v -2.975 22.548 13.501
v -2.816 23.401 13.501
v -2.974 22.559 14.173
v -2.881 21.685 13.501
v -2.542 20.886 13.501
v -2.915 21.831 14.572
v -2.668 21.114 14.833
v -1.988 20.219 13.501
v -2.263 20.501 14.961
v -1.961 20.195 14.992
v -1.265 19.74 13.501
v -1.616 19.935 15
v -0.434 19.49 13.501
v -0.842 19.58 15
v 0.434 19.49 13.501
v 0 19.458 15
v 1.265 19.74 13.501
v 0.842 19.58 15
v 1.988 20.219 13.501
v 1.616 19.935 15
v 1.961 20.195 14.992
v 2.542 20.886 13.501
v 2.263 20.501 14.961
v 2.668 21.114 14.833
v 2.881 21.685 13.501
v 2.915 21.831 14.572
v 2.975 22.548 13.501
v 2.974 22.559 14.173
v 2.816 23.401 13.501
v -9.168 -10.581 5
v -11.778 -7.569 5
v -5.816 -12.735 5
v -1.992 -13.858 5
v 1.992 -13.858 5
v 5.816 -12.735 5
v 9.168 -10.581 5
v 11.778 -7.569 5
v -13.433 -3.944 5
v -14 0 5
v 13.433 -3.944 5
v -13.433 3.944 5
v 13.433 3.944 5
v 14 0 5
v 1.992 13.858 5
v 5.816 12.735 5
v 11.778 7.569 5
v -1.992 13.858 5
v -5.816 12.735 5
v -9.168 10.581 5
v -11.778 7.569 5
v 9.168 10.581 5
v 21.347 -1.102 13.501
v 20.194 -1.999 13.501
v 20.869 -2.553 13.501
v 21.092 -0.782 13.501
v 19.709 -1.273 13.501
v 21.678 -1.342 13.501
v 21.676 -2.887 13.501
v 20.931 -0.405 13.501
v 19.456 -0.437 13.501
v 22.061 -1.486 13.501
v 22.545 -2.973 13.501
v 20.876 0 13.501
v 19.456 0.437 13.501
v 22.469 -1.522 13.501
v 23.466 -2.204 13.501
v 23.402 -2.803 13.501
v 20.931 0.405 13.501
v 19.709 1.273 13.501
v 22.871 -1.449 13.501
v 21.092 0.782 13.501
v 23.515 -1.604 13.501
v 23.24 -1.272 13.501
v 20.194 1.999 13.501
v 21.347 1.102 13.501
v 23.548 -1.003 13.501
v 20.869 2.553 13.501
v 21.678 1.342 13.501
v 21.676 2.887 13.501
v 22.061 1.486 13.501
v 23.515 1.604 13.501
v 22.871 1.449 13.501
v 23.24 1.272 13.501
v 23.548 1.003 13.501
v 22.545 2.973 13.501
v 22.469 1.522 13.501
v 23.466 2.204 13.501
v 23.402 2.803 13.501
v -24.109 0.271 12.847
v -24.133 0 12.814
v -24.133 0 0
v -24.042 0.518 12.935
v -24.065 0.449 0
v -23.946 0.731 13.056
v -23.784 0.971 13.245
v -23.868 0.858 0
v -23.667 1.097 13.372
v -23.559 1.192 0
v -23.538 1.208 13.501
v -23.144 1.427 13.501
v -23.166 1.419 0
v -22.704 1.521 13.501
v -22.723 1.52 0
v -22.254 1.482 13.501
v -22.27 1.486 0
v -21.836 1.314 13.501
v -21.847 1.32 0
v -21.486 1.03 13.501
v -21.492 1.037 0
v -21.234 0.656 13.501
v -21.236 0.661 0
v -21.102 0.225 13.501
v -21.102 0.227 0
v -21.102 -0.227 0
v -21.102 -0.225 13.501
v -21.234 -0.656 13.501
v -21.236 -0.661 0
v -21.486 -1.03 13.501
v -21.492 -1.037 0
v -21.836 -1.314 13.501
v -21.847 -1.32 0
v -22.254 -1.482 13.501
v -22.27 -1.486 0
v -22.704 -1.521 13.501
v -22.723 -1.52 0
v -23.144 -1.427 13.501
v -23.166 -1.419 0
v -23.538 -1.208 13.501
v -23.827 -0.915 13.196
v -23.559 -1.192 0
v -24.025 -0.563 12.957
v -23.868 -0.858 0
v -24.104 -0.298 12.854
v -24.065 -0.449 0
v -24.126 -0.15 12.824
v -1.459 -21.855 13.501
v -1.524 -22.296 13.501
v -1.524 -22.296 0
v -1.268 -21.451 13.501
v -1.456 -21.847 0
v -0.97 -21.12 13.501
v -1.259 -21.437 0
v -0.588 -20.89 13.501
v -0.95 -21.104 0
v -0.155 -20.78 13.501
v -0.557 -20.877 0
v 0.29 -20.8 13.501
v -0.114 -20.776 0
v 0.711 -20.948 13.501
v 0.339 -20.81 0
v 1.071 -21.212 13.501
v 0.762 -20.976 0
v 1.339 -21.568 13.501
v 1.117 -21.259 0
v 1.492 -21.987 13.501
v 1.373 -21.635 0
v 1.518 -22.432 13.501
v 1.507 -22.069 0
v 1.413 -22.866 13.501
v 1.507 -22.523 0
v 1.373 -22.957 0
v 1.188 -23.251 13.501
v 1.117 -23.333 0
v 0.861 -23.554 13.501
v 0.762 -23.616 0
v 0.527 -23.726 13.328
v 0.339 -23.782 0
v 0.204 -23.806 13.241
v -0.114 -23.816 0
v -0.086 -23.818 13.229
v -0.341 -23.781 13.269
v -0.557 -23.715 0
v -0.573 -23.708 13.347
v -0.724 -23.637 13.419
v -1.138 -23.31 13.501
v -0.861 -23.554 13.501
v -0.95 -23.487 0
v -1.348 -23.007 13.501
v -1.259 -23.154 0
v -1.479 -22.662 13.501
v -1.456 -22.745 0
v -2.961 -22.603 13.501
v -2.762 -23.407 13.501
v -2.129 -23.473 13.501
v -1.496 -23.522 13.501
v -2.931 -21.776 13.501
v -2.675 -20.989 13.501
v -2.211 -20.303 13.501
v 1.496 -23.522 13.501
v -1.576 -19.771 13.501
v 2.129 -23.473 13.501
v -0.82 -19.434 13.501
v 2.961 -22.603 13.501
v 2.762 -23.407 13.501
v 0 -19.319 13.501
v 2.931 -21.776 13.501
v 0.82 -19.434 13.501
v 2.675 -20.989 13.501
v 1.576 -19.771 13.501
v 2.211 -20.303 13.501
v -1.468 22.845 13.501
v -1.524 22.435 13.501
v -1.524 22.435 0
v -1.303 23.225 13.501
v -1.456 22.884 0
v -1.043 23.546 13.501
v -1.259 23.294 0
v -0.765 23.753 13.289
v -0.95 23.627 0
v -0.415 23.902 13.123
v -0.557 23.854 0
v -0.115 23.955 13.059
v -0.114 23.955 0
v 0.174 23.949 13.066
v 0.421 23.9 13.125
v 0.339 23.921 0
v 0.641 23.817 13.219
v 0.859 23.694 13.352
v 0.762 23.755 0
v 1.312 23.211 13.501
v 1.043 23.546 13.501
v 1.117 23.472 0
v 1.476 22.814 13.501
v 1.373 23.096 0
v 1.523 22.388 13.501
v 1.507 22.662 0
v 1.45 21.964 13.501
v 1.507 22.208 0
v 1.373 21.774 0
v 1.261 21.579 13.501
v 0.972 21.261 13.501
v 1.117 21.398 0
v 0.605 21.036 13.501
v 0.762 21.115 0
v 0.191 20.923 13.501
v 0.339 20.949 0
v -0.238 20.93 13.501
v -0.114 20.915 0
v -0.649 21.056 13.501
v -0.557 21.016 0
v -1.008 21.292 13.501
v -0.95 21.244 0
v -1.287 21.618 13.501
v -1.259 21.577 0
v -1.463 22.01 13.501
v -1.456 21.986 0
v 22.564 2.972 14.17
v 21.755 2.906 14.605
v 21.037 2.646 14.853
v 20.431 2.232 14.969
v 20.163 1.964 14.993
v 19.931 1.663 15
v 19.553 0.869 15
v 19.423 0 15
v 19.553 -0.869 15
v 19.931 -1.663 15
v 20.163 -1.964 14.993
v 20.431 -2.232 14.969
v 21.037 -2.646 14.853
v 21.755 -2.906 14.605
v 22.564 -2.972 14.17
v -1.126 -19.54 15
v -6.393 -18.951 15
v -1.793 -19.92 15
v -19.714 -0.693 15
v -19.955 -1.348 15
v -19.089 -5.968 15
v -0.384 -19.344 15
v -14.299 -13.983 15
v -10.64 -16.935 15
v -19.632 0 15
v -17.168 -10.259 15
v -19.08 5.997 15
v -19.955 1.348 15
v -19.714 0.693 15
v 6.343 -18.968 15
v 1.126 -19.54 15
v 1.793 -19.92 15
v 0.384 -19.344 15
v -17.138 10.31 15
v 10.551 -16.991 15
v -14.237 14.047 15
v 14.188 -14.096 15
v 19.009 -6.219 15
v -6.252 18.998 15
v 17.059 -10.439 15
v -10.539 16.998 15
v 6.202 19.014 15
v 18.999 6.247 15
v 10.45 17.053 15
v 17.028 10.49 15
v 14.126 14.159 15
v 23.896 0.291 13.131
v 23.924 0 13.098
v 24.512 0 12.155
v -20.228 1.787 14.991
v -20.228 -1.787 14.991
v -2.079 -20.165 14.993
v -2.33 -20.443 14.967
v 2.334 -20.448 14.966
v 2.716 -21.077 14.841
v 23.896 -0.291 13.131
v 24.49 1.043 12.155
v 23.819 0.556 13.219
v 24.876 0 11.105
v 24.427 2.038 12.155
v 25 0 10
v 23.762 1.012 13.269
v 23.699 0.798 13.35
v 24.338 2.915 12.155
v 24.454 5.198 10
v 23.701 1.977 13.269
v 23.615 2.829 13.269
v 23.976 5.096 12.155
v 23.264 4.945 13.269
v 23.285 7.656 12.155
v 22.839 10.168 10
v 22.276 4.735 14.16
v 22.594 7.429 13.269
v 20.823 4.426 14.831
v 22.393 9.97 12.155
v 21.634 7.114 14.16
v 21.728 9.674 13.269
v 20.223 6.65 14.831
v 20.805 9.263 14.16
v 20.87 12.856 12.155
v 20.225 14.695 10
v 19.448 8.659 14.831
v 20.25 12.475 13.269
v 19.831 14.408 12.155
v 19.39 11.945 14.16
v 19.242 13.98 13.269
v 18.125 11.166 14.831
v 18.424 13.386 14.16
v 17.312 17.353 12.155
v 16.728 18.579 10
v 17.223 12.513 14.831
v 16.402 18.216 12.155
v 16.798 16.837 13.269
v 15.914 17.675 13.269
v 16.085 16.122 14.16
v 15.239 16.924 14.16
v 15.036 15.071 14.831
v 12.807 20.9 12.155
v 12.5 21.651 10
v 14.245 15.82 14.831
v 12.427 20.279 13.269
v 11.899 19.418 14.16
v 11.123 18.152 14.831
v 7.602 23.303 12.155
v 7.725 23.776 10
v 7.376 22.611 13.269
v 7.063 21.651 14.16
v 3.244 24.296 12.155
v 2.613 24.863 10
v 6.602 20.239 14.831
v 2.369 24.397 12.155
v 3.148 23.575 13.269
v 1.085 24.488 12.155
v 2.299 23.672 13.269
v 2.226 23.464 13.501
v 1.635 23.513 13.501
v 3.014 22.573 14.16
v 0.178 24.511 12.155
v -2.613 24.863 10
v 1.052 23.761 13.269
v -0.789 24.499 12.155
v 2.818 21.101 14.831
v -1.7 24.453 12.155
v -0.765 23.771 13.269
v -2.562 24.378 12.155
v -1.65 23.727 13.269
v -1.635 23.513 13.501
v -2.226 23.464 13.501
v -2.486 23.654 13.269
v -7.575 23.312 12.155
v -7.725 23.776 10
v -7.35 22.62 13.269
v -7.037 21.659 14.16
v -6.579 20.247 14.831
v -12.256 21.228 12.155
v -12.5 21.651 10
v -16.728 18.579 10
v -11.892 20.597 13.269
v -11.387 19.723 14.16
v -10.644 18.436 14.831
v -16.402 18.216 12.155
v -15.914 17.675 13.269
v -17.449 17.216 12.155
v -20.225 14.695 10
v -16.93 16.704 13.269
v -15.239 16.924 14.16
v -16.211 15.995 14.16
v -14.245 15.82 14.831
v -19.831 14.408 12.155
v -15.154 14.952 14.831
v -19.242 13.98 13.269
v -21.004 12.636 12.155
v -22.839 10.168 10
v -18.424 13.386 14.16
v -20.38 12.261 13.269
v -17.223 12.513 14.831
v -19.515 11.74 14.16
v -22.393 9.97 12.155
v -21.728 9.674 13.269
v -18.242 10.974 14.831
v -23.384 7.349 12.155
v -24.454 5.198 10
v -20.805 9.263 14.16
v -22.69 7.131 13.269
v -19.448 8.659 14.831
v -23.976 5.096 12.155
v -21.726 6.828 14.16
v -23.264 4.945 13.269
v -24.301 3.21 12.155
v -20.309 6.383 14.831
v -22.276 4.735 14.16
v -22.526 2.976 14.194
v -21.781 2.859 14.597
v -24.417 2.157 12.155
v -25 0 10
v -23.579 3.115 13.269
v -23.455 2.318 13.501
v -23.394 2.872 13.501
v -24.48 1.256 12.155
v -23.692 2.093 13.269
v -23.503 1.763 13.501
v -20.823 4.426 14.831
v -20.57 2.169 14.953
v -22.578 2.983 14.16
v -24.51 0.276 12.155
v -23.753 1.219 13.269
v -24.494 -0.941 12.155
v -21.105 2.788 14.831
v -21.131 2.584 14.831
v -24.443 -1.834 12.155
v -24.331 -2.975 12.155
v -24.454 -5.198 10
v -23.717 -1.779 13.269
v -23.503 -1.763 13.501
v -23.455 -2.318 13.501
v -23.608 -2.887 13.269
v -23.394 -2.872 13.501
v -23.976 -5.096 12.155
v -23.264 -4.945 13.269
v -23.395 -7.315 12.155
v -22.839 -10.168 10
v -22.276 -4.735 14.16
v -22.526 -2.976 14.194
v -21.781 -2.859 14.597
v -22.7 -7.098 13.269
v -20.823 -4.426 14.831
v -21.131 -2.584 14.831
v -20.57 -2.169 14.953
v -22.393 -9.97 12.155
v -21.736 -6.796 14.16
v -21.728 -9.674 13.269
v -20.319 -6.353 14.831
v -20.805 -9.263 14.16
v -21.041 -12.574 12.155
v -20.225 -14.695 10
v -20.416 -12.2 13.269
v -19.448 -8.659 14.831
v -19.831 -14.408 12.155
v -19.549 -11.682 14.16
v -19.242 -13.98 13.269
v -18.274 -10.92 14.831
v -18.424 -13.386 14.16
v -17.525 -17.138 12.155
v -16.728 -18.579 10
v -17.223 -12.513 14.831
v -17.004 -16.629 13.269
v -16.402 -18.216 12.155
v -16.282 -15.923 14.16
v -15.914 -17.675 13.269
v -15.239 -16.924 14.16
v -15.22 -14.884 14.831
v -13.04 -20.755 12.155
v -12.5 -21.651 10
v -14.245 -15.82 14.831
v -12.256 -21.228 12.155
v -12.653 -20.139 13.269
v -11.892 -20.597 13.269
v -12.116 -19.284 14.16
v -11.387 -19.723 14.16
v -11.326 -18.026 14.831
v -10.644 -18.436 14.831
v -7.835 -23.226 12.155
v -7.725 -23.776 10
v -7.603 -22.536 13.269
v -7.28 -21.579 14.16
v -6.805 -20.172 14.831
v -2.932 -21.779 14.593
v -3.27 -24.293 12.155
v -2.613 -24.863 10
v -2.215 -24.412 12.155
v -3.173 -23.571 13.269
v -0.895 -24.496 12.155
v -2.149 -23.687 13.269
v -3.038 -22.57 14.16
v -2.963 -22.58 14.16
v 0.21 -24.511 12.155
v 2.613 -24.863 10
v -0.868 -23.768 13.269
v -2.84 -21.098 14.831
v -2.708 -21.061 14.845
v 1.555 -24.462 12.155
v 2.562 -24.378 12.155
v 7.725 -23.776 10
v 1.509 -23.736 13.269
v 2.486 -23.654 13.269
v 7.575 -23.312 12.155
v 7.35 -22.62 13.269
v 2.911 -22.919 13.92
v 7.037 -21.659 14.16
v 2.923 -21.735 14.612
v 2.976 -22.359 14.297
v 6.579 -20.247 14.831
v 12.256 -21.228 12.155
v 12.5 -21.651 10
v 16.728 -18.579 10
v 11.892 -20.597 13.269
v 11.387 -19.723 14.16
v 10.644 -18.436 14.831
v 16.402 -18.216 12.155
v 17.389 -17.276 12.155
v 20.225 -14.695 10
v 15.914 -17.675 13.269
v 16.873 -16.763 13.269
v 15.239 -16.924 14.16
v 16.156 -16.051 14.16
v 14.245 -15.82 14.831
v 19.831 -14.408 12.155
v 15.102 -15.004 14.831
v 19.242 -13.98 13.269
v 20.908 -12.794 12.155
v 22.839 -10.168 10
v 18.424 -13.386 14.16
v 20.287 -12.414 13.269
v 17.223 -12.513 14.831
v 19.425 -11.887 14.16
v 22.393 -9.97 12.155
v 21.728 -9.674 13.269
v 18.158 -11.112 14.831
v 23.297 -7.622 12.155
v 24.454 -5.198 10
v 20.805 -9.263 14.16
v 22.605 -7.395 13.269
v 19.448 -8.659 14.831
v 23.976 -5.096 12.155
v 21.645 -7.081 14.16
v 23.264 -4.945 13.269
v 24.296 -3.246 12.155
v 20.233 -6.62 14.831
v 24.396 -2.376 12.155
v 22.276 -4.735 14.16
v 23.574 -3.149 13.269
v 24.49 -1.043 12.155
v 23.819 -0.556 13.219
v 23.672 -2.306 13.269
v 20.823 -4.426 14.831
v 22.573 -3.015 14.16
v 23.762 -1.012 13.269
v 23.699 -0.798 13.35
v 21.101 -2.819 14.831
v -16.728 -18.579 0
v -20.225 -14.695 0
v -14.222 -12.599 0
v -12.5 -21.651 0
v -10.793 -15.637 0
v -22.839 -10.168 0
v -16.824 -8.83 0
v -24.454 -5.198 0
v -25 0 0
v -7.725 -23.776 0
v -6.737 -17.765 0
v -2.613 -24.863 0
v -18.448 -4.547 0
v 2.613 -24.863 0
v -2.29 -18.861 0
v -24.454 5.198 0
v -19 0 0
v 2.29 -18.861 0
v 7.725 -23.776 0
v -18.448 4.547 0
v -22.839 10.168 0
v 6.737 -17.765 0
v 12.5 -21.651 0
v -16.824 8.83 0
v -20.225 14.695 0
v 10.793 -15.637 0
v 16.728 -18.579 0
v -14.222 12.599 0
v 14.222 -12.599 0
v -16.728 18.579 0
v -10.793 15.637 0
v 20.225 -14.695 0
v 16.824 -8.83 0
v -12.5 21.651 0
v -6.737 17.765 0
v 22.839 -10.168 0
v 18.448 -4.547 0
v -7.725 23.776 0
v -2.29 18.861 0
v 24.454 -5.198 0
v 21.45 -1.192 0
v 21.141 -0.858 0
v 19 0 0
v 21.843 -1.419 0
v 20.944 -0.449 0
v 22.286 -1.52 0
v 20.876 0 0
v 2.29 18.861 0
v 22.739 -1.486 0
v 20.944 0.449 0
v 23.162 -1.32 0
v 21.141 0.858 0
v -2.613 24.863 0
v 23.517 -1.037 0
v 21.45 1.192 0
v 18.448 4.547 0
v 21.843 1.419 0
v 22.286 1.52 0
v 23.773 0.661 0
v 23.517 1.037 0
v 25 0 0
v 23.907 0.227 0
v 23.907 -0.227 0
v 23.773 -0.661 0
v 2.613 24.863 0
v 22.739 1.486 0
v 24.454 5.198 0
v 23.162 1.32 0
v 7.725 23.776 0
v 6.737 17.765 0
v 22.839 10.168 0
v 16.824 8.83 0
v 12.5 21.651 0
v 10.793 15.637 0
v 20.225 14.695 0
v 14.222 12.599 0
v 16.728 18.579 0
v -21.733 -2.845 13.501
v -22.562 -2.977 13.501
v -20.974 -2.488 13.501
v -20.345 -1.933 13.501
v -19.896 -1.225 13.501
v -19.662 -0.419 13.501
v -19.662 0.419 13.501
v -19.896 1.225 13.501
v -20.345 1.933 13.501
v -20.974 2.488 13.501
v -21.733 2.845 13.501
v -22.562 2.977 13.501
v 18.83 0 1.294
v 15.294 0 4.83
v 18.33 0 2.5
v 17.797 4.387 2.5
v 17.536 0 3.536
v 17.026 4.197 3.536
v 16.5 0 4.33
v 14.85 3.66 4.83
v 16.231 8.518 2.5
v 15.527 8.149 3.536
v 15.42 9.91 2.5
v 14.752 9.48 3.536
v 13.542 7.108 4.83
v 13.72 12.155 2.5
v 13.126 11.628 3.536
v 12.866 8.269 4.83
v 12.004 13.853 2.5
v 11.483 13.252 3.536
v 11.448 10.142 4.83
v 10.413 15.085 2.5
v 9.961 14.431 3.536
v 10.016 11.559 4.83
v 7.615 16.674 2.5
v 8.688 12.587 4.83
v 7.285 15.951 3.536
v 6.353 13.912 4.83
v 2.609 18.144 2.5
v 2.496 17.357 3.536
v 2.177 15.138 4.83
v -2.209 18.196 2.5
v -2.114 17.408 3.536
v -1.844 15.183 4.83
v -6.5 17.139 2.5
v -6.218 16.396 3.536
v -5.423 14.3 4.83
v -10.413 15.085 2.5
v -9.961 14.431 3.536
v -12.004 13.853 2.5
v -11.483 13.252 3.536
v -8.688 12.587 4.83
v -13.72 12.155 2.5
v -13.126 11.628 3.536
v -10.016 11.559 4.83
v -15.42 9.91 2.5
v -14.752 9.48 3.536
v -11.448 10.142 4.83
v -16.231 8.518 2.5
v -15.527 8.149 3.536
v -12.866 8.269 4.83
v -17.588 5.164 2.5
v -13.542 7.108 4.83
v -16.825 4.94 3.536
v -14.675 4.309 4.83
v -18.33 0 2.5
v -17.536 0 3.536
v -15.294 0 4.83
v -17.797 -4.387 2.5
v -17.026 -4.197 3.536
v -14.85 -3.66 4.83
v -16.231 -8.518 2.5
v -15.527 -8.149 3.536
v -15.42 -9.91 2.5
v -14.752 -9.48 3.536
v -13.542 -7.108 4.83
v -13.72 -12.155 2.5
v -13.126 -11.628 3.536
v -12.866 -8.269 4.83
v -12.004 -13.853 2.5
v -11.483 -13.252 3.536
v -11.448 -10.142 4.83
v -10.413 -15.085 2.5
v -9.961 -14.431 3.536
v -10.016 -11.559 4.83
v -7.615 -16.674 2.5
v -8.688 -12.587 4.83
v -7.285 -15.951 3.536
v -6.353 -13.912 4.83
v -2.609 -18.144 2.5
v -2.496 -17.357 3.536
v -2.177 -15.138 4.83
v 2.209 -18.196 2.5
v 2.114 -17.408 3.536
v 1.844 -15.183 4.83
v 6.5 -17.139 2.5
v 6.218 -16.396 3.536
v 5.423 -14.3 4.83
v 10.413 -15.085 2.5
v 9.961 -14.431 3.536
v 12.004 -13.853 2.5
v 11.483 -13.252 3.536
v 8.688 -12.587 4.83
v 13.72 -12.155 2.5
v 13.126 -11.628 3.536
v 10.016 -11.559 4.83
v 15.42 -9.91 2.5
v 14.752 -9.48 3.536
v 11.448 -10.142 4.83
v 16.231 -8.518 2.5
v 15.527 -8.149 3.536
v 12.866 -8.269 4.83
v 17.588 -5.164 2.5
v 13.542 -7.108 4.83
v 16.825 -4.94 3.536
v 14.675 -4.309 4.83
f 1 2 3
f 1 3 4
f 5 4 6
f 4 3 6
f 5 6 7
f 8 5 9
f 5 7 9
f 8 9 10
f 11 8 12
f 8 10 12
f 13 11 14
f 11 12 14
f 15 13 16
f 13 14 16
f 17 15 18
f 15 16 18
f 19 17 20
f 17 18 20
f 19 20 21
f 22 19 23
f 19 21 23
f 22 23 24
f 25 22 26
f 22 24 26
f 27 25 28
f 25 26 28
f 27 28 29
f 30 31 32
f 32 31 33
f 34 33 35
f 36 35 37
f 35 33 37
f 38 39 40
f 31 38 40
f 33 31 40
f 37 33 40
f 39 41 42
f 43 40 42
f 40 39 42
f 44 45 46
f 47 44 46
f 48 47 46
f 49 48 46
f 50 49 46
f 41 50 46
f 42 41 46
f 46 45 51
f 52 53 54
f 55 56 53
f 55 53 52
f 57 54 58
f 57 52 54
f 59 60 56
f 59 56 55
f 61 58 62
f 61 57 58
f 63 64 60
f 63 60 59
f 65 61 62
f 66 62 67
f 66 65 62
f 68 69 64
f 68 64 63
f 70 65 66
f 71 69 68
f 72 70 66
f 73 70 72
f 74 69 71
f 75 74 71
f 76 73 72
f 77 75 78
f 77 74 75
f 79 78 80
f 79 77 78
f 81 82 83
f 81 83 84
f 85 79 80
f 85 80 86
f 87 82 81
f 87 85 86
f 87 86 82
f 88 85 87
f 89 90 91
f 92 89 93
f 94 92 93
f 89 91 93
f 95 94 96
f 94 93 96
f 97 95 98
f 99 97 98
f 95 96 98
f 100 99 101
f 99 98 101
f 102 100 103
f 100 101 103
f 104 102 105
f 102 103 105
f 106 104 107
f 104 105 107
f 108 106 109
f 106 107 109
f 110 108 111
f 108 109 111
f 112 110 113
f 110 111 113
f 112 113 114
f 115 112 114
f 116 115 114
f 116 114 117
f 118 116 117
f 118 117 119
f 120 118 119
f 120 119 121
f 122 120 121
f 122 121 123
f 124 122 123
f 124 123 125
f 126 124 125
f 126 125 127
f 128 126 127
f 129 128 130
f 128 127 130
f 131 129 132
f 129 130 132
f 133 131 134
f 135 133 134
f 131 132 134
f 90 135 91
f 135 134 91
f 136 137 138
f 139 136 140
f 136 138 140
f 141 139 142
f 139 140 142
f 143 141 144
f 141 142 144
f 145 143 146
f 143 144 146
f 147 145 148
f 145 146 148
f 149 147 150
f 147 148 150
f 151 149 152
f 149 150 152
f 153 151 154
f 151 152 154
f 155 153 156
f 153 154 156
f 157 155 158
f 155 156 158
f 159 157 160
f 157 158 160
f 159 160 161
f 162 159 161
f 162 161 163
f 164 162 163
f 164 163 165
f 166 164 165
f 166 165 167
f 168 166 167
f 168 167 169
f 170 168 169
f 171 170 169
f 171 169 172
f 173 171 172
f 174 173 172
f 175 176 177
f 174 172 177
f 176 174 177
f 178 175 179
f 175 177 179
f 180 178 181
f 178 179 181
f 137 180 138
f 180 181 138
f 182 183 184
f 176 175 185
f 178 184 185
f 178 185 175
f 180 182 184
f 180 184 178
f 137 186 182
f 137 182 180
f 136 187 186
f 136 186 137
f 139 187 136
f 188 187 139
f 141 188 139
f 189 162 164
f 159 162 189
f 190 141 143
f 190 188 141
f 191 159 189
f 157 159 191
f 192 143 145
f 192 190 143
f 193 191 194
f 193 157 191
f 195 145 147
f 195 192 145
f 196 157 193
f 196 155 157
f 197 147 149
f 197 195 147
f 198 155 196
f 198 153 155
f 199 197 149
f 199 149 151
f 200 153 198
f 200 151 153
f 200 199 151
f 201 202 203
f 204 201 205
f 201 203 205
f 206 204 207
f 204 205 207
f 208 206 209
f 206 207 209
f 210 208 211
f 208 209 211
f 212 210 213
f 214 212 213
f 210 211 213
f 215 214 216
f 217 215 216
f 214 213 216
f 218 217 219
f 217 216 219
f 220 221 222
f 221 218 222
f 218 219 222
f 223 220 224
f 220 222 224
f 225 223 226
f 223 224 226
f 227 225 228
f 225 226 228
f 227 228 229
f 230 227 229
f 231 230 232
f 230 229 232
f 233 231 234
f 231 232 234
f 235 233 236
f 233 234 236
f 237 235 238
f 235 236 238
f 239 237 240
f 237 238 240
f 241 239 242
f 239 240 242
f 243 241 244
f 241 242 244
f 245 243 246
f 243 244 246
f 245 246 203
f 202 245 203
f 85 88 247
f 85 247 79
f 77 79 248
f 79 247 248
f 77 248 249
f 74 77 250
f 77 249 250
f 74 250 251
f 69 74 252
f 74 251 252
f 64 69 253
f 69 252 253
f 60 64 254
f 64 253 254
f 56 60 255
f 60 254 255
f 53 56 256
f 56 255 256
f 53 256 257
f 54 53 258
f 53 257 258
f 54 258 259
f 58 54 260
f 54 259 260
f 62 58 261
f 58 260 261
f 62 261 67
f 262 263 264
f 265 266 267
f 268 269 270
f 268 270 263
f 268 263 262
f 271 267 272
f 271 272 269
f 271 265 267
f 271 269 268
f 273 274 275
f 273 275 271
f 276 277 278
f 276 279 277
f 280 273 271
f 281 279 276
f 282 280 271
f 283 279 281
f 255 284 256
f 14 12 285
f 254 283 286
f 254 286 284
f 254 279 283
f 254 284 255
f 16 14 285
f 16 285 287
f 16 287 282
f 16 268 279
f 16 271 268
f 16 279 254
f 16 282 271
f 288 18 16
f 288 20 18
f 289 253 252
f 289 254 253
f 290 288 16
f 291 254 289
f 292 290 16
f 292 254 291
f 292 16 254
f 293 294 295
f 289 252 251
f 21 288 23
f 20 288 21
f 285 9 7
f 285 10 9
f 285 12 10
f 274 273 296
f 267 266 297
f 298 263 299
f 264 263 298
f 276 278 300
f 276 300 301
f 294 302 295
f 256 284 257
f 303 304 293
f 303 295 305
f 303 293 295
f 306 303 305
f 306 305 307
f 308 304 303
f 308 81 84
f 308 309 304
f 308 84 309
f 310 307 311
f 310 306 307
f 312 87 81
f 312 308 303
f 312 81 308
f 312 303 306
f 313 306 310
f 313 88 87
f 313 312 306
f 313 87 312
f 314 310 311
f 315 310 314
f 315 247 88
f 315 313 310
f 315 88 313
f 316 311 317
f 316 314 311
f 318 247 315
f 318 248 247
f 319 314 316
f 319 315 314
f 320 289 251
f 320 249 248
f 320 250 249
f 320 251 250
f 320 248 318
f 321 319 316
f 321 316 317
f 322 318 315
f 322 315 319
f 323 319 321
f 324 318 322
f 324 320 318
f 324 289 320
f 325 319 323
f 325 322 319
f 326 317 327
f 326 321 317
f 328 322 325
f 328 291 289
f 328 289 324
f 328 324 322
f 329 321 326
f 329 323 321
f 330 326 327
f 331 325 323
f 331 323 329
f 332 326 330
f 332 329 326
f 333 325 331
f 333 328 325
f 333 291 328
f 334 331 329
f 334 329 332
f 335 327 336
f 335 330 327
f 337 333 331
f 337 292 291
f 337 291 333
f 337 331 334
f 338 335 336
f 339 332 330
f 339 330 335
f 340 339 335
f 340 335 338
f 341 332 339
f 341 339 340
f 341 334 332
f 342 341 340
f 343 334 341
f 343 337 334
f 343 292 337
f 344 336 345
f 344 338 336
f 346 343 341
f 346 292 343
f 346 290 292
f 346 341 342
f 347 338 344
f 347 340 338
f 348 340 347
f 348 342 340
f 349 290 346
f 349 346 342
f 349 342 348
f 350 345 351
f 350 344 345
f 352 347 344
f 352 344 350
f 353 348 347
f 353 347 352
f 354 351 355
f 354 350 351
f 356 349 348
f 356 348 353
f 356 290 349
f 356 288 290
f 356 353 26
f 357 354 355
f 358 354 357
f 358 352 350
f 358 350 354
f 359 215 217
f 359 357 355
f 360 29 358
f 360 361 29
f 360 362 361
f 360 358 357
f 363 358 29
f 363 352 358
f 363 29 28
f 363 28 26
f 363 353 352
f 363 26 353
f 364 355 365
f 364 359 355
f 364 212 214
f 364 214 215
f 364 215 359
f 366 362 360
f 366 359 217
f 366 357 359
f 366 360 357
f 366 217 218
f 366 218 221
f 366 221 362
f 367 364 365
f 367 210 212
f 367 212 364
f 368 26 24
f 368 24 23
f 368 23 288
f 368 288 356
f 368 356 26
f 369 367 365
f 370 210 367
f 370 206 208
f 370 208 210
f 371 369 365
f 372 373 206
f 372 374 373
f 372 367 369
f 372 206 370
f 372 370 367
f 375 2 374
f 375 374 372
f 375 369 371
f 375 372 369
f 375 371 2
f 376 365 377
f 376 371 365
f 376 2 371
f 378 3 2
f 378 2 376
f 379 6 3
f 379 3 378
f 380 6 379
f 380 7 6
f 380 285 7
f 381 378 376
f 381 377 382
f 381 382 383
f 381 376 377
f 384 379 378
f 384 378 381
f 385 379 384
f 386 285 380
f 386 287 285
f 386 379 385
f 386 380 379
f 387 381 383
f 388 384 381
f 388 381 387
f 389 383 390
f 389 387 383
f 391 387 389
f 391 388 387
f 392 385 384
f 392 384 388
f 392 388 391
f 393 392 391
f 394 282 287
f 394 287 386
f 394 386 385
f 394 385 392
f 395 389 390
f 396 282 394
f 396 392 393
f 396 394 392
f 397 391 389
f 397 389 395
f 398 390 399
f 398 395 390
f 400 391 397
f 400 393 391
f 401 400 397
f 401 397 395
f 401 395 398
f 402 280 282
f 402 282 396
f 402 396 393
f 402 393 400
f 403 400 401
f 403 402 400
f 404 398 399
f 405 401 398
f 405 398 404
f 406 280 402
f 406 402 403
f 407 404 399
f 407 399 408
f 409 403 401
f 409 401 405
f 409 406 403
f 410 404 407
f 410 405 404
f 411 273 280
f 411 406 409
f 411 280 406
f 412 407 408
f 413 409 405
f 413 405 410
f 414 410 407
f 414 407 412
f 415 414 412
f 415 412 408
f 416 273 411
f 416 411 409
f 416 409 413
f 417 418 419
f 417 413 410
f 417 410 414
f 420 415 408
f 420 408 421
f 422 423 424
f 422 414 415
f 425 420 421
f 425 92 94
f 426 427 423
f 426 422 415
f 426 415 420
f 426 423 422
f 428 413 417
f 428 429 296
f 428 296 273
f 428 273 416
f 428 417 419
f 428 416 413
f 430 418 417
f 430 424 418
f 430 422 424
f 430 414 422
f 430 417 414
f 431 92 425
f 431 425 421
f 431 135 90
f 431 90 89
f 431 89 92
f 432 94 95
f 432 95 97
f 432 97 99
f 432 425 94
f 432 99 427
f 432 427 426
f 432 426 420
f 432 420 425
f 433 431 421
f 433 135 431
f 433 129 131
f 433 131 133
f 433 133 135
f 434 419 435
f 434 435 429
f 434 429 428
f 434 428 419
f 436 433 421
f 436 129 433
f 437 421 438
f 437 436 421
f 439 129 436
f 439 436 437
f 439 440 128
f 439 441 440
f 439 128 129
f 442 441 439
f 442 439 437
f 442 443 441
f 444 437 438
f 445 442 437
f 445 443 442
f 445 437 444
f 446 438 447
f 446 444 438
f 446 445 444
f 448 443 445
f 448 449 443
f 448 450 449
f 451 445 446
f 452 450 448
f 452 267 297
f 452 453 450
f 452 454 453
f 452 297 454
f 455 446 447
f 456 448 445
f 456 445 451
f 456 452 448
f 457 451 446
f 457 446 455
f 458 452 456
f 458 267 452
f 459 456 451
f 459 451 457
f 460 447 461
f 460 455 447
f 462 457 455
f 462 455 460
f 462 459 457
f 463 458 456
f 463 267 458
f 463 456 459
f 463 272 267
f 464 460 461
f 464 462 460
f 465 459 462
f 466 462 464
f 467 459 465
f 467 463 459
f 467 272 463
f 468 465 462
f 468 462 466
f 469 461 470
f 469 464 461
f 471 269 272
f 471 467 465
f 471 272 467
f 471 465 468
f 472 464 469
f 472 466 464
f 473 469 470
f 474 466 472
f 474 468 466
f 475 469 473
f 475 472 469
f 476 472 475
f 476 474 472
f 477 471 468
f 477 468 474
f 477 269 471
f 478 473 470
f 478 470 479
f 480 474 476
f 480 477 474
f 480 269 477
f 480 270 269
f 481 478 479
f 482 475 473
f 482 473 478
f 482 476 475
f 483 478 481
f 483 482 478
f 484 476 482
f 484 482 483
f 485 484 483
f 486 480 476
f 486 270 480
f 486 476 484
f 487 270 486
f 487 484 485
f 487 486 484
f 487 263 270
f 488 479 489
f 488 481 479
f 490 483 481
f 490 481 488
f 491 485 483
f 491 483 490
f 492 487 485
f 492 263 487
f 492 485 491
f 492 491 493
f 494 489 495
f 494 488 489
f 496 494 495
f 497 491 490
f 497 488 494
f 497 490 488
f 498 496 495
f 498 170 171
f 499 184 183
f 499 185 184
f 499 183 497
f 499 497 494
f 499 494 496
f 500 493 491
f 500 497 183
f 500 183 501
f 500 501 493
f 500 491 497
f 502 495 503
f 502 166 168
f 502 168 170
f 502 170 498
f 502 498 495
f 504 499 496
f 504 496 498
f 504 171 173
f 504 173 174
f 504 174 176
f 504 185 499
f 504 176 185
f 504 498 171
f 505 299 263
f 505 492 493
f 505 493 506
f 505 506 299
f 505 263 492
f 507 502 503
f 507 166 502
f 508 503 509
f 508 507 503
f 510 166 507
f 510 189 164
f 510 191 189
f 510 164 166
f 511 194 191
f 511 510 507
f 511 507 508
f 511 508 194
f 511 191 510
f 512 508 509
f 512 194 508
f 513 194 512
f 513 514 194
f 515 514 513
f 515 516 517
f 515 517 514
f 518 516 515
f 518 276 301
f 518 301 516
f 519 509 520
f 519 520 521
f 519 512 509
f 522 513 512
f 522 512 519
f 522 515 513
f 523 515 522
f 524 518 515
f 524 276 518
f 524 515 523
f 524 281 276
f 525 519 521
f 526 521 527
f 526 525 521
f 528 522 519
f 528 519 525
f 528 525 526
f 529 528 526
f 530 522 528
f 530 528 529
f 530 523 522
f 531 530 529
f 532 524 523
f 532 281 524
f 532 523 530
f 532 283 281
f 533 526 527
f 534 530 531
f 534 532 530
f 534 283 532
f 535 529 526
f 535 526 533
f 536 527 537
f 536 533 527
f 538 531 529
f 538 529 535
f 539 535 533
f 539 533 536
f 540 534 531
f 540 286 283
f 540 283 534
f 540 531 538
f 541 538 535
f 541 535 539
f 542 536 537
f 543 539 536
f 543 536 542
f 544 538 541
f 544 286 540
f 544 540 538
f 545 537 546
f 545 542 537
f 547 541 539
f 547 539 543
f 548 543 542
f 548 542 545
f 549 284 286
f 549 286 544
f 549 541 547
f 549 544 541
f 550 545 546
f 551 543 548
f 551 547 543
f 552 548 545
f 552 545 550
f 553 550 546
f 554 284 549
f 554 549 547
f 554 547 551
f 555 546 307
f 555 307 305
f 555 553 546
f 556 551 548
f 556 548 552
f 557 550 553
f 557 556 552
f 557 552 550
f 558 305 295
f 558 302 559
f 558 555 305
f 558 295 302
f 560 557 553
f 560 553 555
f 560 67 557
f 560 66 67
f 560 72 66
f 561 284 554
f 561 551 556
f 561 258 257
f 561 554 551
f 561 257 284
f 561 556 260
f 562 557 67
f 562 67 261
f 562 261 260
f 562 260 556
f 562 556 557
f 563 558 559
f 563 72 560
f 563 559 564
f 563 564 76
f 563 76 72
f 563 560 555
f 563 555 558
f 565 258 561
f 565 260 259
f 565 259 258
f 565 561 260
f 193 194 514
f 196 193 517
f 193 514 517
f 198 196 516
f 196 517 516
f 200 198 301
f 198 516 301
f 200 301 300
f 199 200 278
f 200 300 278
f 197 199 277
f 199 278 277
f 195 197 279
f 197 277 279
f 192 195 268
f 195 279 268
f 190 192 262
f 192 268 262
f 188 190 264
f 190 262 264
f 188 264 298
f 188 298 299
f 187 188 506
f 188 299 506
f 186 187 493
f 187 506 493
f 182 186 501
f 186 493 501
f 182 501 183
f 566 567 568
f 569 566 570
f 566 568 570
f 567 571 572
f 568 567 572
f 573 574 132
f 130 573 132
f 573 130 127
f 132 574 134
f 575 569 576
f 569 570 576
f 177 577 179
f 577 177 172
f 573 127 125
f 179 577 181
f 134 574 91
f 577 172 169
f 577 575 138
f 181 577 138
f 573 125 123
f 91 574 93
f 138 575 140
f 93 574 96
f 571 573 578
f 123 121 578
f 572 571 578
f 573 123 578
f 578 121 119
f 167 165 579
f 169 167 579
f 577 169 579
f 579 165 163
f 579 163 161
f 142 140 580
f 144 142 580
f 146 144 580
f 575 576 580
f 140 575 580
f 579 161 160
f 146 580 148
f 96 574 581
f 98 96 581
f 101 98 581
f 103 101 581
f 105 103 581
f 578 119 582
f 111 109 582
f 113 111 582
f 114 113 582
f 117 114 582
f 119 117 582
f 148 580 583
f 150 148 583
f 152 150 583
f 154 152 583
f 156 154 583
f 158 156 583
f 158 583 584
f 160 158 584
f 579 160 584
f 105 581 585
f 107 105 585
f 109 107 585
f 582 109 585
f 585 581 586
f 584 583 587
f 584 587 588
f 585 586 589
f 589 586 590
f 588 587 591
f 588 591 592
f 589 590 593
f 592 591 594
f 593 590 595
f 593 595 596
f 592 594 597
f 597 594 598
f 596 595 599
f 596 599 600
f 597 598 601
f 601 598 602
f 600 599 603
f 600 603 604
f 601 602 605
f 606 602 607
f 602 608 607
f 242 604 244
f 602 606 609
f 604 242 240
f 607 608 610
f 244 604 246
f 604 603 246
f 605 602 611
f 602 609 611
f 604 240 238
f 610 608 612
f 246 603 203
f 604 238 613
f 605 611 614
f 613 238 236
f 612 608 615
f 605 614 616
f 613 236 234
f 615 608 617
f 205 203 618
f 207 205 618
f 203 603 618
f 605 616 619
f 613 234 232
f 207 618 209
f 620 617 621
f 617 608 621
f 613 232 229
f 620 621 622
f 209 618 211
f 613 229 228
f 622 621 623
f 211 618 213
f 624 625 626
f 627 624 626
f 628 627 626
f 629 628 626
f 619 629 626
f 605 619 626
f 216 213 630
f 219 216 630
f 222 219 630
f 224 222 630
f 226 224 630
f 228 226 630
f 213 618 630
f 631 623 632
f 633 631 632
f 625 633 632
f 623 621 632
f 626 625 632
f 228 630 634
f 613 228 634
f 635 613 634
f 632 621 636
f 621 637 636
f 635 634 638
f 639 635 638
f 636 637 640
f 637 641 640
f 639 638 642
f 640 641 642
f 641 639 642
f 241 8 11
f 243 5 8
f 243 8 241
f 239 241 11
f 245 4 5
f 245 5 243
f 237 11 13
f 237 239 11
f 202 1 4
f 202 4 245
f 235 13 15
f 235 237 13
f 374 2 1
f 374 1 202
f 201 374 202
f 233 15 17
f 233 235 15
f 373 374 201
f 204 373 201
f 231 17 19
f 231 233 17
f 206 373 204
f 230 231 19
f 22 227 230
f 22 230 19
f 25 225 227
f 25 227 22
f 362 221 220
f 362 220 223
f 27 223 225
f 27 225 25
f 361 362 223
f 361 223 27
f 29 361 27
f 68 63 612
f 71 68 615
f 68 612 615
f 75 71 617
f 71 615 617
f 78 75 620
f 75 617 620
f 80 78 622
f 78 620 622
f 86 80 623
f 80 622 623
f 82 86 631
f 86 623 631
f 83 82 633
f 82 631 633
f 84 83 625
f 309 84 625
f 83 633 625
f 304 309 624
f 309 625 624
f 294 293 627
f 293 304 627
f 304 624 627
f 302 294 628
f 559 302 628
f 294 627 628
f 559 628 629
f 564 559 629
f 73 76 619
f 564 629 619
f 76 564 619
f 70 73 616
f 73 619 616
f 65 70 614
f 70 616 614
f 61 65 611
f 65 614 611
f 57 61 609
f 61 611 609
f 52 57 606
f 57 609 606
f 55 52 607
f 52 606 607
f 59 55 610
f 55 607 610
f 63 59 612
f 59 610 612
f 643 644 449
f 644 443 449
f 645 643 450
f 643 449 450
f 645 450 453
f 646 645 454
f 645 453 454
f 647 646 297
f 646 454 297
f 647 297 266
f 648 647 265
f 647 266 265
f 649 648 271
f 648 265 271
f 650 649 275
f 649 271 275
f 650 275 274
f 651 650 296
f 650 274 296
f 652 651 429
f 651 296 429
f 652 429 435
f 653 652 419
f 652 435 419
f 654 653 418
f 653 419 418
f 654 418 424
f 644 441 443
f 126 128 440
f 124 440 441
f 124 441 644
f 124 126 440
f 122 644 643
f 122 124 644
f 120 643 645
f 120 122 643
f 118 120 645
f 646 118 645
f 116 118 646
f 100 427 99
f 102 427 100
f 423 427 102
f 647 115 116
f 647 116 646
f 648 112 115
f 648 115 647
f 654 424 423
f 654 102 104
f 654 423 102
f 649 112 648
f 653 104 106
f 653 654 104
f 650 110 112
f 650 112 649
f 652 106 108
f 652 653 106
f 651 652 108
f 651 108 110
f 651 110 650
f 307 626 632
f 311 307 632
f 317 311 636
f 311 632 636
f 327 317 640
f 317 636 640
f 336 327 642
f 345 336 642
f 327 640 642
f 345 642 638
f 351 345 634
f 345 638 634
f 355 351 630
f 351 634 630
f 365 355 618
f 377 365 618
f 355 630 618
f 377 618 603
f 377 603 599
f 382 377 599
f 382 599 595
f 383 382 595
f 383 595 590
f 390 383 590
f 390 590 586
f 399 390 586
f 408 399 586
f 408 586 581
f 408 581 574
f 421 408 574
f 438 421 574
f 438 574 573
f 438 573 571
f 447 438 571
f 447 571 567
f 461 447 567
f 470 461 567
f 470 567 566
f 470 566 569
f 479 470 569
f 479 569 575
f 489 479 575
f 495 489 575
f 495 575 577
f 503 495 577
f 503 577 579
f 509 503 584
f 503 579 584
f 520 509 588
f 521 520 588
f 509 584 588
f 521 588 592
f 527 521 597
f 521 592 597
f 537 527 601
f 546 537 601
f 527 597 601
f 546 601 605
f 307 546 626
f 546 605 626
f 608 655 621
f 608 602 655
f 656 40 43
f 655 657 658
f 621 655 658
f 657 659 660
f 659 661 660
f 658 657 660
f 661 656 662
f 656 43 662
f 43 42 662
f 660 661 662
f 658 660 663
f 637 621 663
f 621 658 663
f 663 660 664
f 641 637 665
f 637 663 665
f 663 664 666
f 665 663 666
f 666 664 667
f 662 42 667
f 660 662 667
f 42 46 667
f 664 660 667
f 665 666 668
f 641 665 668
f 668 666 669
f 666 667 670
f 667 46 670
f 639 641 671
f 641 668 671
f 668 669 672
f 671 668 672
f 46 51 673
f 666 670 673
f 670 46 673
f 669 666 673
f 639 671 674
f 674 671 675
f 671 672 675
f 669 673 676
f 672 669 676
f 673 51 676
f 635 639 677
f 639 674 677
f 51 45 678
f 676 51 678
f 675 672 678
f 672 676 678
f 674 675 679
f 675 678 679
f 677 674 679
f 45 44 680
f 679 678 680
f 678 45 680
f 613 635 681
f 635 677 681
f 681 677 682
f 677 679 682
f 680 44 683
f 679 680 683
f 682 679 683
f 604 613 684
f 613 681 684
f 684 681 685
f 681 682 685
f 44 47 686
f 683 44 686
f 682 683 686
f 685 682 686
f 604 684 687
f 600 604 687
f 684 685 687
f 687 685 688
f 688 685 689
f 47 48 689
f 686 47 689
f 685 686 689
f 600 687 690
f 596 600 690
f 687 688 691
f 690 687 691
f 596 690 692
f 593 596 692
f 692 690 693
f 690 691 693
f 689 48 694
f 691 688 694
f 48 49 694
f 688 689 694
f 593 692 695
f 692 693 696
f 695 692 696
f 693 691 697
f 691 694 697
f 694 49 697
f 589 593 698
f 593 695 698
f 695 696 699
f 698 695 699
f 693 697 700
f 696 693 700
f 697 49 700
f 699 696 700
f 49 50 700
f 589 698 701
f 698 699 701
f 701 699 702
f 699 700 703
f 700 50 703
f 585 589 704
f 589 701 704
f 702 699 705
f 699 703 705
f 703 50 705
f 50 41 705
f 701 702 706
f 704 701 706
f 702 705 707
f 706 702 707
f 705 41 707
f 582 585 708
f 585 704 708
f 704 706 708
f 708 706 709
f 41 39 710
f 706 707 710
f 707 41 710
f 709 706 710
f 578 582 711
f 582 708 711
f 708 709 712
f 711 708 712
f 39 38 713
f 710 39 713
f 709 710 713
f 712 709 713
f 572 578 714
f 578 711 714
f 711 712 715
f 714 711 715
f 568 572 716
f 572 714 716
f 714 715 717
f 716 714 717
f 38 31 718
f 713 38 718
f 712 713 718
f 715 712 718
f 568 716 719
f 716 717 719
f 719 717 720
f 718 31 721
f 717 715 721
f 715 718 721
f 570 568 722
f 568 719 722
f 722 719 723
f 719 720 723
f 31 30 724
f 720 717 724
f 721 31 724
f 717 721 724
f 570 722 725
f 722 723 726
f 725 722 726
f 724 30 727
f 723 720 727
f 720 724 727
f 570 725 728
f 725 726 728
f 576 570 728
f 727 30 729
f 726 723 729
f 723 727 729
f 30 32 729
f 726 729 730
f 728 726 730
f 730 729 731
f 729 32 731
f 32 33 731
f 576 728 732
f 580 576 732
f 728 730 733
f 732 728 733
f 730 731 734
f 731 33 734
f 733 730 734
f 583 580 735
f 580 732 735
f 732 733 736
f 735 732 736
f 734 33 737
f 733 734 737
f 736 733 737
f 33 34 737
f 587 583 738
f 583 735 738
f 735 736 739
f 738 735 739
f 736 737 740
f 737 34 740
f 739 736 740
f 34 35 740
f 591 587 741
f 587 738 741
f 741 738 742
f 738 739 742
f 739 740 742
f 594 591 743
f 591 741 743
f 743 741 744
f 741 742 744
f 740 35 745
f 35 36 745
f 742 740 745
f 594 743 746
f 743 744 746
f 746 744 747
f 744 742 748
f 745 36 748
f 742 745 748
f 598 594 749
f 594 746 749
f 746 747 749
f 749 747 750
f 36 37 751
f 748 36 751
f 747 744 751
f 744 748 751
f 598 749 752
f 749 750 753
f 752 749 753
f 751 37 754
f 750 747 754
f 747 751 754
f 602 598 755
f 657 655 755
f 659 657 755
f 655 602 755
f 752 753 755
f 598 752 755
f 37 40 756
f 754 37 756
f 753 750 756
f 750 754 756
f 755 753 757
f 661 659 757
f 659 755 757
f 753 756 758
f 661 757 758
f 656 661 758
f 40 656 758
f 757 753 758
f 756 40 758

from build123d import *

# Parameters (mm, degrees)
SKETCH1_R                                           = 25
SKETCH1_R_2                                         = 19
BOSS_EXTRUDE1_DEPTH                                 = 5
SKETCH2_R                                           = 25
BOSS_EXTRUDE2_DEPTH                                 = 10
FILLET1_R                                           = 5
CBORE_FOR_3_BINDING_HEAD_MACHINE_SCREW1_D           = 3.048
CBORE_FOR_3_BINDING_HEAD_MACHINE_SCREW1_CBORE_D     = 5.95376
CBORE_FOR_3_BINDING_HEAD_MACHINE_SCREW1_CBORE_DEPTH = 1.4986


with BuildPart() as part:
    # Sketch1 → Boss-Extrude1 (new body)
    with BuildSketch(Plane.XY):
        Circle(SKETCH1_R)
        Circle(SKETCH1_R_2, mode=Mode.SUBTRACT)
    extrude(amount=BOSS_EXTRUDE1_DEPTH)

    # Sketch2 → Boss-Extrude2 (add)
    with BuildSketch(Plane.XY.offset(5)):
        Circle(SKETCH2_R)
    extrude(amount=BOSS_EXTRUDE2_DEPTH)

    # Fillet1
    fillet1_edges = [part.edges().sort_by_distance(p)[0] for p in [
        (-25, 0, 15),
        (-19, 0, 5),
    ]]
    fillet(fillet1_edges, radius=FILLET1_R - 0.0001)  # a hair under: the kernel refuses the full size

    # CBORE for #3 Binding Head Machine Screw1 (through all)
    with Locations(Plane.XY.offset(15)):
        with Locations((0, 22.435050854), (0, -22.295918756), (22.400267829, 0), (-22.608965977, 0)):
            CounterBoreHole(CBORE_FOR_3_BINDING_HEAD_MACHINE_SCREW1_D / 2, CBORE_FOR_3_BINDING_HEAD_MACHINE_SCREW1_CBORE_D / 2, CBORE_FOR_3_BINDING_HEAD_MACHINE_SCREW1_CBORE_DEPTH)


solid = part.part
